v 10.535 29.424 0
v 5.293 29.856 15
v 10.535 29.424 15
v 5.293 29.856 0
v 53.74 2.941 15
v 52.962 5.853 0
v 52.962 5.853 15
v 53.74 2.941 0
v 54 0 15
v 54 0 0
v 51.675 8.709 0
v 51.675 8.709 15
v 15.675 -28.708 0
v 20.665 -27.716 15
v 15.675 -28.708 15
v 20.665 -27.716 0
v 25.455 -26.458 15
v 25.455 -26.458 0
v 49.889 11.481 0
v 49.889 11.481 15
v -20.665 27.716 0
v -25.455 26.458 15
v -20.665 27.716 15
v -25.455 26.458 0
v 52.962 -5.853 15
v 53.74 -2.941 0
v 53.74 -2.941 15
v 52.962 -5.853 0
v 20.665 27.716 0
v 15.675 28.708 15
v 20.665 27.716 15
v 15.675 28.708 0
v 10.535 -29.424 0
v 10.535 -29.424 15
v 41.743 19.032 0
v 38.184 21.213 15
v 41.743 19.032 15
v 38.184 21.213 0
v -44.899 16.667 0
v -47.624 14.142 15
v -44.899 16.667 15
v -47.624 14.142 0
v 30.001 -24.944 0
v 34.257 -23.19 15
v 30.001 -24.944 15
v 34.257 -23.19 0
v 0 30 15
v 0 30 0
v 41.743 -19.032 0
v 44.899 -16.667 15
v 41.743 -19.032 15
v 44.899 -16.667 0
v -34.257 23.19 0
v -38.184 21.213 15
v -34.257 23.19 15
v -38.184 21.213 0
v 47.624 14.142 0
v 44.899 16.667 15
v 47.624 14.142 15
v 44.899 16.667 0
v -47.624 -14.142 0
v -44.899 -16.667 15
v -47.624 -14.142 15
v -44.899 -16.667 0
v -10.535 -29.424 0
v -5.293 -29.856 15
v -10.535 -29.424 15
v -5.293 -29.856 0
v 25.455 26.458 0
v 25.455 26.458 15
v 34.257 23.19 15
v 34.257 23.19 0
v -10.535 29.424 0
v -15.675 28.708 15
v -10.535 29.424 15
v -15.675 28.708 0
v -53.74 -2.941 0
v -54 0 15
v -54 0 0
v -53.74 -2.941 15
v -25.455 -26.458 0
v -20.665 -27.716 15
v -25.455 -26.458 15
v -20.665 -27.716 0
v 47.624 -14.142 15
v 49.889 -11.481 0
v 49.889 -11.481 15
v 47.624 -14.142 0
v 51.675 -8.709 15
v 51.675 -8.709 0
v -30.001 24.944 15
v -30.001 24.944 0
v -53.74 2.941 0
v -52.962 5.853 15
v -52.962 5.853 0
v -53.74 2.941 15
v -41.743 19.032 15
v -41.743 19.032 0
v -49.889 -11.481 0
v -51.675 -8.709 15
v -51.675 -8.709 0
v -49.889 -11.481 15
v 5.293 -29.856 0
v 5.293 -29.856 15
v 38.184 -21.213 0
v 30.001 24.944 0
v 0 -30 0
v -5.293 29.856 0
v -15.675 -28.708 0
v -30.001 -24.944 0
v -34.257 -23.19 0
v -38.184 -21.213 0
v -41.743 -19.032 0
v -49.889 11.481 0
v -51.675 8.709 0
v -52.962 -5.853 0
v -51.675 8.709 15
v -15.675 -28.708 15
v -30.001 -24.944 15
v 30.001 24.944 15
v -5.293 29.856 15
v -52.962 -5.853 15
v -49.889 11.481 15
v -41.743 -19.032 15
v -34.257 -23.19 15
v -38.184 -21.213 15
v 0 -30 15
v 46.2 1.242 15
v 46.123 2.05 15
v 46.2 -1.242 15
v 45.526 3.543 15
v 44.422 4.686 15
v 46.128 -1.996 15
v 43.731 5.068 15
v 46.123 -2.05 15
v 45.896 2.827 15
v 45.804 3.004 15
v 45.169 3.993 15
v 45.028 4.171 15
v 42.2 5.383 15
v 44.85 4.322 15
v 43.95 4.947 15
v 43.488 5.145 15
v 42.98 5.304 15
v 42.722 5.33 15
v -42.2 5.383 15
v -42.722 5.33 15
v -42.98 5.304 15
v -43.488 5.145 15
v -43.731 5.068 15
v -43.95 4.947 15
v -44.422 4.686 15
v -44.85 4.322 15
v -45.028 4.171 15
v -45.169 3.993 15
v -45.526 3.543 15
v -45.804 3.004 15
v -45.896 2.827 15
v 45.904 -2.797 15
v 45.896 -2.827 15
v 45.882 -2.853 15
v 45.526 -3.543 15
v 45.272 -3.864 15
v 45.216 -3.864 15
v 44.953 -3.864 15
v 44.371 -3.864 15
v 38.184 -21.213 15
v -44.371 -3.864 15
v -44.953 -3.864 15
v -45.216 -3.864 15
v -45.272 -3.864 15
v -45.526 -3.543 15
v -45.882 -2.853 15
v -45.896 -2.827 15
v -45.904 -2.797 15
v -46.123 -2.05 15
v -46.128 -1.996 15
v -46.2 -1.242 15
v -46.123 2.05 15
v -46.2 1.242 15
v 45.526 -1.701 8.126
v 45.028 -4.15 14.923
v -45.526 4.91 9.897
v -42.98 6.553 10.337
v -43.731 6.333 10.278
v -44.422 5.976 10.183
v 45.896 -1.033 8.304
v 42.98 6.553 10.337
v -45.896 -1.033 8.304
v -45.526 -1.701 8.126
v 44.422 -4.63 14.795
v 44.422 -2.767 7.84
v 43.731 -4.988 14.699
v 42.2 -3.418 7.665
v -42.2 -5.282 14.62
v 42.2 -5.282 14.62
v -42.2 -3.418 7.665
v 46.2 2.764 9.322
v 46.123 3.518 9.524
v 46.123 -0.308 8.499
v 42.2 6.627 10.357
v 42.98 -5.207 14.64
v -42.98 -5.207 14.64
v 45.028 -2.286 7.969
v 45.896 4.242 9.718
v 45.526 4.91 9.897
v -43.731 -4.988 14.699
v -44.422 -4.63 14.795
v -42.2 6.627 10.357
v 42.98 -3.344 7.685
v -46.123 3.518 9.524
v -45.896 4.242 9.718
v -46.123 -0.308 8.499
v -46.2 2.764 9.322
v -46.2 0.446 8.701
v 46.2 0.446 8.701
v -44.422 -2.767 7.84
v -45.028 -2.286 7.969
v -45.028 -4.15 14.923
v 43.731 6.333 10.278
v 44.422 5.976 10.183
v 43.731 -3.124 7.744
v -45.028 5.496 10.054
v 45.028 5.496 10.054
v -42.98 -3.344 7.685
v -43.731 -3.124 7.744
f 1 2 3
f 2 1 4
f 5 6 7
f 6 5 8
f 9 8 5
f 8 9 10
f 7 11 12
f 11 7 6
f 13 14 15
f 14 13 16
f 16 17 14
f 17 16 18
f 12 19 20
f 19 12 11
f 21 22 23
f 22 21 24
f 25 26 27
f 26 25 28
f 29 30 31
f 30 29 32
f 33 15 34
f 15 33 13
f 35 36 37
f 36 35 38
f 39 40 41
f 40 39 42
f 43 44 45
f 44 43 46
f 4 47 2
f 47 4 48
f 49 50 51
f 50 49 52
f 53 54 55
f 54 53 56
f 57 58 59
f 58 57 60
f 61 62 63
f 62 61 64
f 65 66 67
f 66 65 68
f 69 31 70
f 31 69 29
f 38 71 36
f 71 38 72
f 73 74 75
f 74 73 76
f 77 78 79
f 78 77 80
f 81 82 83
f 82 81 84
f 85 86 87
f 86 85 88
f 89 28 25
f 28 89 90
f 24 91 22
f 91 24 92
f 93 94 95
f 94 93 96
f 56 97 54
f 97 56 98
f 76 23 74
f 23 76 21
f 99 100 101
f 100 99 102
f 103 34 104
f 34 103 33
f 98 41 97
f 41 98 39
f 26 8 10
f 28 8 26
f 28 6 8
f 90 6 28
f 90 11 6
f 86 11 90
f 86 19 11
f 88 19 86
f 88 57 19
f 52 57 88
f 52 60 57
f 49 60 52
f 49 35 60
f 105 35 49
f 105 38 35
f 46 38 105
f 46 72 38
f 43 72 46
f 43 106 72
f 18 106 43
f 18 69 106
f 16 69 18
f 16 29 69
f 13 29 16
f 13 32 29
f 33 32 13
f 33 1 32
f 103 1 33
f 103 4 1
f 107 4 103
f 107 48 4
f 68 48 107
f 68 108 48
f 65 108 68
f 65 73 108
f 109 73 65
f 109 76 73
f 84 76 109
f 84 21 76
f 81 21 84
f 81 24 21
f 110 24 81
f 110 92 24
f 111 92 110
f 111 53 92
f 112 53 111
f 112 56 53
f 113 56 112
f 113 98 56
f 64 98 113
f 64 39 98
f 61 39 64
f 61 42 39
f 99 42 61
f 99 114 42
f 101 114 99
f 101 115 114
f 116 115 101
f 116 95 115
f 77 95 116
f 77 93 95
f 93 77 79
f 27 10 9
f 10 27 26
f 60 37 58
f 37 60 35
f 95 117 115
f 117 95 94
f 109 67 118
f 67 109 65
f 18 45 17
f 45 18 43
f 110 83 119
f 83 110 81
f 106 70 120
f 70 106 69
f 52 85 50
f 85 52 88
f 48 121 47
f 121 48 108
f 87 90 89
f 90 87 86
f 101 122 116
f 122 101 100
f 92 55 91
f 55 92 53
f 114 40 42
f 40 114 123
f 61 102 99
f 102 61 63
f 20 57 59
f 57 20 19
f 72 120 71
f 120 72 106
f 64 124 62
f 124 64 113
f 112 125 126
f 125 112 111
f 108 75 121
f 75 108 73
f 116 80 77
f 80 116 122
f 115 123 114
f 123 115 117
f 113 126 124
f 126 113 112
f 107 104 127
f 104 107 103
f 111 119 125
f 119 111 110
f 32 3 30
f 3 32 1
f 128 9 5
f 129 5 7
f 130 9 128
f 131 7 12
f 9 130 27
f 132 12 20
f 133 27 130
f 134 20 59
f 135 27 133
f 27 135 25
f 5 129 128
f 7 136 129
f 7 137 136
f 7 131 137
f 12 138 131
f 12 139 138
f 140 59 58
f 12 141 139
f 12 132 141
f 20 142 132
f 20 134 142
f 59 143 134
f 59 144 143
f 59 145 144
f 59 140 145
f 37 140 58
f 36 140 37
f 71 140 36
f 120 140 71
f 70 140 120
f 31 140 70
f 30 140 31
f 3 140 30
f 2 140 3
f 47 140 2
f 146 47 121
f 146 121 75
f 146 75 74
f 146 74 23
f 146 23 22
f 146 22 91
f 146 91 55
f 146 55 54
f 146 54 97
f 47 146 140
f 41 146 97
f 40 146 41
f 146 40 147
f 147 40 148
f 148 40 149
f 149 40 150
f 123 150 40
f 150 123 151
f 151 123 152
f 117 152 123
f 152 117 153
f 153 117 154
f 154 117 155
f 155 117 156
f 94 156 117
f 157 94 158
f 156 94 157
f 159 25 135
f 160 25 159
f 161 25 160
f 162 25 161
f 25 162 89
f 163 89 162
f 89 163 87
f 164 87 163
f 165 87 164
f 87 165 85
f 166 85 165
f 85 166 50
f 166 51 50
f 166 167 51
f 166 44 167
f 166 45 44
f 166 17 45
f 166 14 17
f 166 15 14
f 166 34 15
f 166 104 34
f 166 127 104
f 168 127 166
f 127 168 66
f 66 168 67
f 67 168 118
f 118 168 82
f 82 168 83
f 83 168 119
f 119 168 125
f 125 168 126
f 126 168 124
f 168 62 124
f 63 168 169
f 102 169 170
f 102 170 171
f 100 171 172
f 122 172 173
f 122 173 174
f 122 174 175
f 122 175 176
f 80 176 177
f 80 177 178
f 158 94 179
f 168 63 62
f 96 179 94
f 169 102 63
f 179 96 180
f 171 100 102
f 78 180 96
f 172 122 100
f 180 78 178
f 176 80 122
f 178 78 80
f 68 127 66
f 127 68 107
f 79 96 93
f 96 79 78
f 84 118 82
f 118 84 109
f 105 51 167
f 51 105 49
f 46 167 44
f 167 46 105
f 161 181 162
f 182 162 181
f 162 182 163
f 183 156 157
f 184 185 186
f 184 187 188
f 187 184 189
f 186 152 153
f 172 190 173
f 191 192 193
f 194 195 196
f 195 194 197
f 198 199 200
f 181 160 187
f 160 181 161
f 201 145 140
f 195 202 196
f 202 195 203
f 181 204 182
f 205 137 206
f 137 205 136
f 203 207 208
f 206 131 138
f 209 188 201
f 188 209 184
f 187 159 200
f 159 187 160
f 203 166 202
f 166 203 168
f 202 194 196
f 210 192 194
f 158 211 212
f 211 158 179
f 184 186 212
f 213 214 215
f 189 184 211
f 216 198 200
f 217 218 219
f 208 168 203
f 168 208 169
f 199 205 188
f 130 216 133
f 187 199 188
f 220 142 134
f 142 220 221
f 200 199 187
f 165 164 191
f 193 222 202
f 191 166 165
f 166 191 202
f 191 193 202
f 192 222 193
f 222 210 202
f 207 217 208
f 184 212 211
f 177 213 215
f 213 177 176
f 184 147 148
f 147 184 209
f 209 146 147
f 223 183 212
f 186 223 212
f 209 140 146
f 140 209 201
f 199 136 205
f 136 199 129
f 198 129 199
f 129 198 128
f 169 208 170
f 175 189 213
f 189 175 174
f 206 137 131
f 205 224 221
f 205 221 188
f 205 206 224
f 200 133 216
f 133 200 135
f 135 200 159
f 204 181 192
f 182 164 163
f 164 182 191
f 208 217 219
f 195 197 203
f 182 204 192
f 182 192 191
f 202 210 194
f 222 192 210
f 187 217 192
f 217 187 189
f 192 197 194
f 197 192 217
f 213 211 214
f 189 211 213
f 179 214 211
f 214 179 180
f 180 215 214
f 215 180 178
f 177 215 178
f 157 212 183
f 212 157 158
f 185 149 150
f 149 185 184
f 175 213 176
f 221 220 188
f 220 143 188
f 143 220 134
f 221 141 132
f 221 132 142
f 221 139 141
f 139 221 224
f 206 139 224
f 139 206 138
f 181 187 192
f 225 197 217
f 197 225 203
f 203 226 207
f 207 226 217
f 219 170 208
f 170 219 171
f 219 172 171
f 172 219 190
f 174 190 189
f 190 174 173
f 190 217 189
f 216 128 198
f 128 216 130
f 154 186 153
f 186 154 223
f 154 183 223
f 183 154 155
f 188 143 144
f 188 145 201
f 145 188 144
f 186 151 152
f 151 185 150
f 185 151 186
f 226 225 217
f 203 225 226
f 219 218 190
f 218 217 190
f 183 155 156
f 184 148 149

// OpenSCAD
// PrimeBind Toploader Lean Stand
// Case sits in an angled groove and leans back 15° — window faces viewer
// Gravity seats the case deeper into the groove — self-stabilizing

$fn = 64;

// ─── CASE REFERENCE ────────────────────────────────────────────
case_w = 92.0;
case_d = 10.0;
r_case = 4.0;

// ─── STAND PARAMS ──────────────────────────────────────────────
lean    = 15;       // degrees from vertical — case leans backward
base_w  = 108.0;   // oval width (8mm each side of case)
base_d  = 60.0;    // oval depth — deeper = more stable
base_h  = 15.0;    // stand height
g_depth = 6.2;     // groove depth along lean axis (6mm vertical — clears 7mm window start)

cut_l = case_w + 0.4;   // 92.4mm — 0.2mm clearance per side
cut_w = case_d + 0.4;   // 10.4mm

// ─── GROOVE PROFILE ────────────────────────────────────────────
module groove_shape(h) {
    hull() {
        for (xi = [r_case, cut_l - r_case])
            for (yi = [r_case, cut_w - r_case])
                translate([xi, yi, 0]) cylinder(r=r_case, h=h, $fn=32);
    }
}

// ─── STAND ─────────────────────────────────────────────────────
module stand() {
    difference() {
        // oval base centered at origin
        scale([base_w / base_d, 1, 1])
            cylinder(r = base_d / 2, h = base_h);

        // angled groove — rotate around X tilts groove toward back (+Y)
        // case inserted at 15° lean slots in and gravity holds it
        translate([0, 0, base_h])
            rotate([lean, 0, 0])
                translate([-cut_l/2, -cut_w/2, -g_depth])
                    groove_shape(g_depth + 1);
    }
}

color("white") stand();
